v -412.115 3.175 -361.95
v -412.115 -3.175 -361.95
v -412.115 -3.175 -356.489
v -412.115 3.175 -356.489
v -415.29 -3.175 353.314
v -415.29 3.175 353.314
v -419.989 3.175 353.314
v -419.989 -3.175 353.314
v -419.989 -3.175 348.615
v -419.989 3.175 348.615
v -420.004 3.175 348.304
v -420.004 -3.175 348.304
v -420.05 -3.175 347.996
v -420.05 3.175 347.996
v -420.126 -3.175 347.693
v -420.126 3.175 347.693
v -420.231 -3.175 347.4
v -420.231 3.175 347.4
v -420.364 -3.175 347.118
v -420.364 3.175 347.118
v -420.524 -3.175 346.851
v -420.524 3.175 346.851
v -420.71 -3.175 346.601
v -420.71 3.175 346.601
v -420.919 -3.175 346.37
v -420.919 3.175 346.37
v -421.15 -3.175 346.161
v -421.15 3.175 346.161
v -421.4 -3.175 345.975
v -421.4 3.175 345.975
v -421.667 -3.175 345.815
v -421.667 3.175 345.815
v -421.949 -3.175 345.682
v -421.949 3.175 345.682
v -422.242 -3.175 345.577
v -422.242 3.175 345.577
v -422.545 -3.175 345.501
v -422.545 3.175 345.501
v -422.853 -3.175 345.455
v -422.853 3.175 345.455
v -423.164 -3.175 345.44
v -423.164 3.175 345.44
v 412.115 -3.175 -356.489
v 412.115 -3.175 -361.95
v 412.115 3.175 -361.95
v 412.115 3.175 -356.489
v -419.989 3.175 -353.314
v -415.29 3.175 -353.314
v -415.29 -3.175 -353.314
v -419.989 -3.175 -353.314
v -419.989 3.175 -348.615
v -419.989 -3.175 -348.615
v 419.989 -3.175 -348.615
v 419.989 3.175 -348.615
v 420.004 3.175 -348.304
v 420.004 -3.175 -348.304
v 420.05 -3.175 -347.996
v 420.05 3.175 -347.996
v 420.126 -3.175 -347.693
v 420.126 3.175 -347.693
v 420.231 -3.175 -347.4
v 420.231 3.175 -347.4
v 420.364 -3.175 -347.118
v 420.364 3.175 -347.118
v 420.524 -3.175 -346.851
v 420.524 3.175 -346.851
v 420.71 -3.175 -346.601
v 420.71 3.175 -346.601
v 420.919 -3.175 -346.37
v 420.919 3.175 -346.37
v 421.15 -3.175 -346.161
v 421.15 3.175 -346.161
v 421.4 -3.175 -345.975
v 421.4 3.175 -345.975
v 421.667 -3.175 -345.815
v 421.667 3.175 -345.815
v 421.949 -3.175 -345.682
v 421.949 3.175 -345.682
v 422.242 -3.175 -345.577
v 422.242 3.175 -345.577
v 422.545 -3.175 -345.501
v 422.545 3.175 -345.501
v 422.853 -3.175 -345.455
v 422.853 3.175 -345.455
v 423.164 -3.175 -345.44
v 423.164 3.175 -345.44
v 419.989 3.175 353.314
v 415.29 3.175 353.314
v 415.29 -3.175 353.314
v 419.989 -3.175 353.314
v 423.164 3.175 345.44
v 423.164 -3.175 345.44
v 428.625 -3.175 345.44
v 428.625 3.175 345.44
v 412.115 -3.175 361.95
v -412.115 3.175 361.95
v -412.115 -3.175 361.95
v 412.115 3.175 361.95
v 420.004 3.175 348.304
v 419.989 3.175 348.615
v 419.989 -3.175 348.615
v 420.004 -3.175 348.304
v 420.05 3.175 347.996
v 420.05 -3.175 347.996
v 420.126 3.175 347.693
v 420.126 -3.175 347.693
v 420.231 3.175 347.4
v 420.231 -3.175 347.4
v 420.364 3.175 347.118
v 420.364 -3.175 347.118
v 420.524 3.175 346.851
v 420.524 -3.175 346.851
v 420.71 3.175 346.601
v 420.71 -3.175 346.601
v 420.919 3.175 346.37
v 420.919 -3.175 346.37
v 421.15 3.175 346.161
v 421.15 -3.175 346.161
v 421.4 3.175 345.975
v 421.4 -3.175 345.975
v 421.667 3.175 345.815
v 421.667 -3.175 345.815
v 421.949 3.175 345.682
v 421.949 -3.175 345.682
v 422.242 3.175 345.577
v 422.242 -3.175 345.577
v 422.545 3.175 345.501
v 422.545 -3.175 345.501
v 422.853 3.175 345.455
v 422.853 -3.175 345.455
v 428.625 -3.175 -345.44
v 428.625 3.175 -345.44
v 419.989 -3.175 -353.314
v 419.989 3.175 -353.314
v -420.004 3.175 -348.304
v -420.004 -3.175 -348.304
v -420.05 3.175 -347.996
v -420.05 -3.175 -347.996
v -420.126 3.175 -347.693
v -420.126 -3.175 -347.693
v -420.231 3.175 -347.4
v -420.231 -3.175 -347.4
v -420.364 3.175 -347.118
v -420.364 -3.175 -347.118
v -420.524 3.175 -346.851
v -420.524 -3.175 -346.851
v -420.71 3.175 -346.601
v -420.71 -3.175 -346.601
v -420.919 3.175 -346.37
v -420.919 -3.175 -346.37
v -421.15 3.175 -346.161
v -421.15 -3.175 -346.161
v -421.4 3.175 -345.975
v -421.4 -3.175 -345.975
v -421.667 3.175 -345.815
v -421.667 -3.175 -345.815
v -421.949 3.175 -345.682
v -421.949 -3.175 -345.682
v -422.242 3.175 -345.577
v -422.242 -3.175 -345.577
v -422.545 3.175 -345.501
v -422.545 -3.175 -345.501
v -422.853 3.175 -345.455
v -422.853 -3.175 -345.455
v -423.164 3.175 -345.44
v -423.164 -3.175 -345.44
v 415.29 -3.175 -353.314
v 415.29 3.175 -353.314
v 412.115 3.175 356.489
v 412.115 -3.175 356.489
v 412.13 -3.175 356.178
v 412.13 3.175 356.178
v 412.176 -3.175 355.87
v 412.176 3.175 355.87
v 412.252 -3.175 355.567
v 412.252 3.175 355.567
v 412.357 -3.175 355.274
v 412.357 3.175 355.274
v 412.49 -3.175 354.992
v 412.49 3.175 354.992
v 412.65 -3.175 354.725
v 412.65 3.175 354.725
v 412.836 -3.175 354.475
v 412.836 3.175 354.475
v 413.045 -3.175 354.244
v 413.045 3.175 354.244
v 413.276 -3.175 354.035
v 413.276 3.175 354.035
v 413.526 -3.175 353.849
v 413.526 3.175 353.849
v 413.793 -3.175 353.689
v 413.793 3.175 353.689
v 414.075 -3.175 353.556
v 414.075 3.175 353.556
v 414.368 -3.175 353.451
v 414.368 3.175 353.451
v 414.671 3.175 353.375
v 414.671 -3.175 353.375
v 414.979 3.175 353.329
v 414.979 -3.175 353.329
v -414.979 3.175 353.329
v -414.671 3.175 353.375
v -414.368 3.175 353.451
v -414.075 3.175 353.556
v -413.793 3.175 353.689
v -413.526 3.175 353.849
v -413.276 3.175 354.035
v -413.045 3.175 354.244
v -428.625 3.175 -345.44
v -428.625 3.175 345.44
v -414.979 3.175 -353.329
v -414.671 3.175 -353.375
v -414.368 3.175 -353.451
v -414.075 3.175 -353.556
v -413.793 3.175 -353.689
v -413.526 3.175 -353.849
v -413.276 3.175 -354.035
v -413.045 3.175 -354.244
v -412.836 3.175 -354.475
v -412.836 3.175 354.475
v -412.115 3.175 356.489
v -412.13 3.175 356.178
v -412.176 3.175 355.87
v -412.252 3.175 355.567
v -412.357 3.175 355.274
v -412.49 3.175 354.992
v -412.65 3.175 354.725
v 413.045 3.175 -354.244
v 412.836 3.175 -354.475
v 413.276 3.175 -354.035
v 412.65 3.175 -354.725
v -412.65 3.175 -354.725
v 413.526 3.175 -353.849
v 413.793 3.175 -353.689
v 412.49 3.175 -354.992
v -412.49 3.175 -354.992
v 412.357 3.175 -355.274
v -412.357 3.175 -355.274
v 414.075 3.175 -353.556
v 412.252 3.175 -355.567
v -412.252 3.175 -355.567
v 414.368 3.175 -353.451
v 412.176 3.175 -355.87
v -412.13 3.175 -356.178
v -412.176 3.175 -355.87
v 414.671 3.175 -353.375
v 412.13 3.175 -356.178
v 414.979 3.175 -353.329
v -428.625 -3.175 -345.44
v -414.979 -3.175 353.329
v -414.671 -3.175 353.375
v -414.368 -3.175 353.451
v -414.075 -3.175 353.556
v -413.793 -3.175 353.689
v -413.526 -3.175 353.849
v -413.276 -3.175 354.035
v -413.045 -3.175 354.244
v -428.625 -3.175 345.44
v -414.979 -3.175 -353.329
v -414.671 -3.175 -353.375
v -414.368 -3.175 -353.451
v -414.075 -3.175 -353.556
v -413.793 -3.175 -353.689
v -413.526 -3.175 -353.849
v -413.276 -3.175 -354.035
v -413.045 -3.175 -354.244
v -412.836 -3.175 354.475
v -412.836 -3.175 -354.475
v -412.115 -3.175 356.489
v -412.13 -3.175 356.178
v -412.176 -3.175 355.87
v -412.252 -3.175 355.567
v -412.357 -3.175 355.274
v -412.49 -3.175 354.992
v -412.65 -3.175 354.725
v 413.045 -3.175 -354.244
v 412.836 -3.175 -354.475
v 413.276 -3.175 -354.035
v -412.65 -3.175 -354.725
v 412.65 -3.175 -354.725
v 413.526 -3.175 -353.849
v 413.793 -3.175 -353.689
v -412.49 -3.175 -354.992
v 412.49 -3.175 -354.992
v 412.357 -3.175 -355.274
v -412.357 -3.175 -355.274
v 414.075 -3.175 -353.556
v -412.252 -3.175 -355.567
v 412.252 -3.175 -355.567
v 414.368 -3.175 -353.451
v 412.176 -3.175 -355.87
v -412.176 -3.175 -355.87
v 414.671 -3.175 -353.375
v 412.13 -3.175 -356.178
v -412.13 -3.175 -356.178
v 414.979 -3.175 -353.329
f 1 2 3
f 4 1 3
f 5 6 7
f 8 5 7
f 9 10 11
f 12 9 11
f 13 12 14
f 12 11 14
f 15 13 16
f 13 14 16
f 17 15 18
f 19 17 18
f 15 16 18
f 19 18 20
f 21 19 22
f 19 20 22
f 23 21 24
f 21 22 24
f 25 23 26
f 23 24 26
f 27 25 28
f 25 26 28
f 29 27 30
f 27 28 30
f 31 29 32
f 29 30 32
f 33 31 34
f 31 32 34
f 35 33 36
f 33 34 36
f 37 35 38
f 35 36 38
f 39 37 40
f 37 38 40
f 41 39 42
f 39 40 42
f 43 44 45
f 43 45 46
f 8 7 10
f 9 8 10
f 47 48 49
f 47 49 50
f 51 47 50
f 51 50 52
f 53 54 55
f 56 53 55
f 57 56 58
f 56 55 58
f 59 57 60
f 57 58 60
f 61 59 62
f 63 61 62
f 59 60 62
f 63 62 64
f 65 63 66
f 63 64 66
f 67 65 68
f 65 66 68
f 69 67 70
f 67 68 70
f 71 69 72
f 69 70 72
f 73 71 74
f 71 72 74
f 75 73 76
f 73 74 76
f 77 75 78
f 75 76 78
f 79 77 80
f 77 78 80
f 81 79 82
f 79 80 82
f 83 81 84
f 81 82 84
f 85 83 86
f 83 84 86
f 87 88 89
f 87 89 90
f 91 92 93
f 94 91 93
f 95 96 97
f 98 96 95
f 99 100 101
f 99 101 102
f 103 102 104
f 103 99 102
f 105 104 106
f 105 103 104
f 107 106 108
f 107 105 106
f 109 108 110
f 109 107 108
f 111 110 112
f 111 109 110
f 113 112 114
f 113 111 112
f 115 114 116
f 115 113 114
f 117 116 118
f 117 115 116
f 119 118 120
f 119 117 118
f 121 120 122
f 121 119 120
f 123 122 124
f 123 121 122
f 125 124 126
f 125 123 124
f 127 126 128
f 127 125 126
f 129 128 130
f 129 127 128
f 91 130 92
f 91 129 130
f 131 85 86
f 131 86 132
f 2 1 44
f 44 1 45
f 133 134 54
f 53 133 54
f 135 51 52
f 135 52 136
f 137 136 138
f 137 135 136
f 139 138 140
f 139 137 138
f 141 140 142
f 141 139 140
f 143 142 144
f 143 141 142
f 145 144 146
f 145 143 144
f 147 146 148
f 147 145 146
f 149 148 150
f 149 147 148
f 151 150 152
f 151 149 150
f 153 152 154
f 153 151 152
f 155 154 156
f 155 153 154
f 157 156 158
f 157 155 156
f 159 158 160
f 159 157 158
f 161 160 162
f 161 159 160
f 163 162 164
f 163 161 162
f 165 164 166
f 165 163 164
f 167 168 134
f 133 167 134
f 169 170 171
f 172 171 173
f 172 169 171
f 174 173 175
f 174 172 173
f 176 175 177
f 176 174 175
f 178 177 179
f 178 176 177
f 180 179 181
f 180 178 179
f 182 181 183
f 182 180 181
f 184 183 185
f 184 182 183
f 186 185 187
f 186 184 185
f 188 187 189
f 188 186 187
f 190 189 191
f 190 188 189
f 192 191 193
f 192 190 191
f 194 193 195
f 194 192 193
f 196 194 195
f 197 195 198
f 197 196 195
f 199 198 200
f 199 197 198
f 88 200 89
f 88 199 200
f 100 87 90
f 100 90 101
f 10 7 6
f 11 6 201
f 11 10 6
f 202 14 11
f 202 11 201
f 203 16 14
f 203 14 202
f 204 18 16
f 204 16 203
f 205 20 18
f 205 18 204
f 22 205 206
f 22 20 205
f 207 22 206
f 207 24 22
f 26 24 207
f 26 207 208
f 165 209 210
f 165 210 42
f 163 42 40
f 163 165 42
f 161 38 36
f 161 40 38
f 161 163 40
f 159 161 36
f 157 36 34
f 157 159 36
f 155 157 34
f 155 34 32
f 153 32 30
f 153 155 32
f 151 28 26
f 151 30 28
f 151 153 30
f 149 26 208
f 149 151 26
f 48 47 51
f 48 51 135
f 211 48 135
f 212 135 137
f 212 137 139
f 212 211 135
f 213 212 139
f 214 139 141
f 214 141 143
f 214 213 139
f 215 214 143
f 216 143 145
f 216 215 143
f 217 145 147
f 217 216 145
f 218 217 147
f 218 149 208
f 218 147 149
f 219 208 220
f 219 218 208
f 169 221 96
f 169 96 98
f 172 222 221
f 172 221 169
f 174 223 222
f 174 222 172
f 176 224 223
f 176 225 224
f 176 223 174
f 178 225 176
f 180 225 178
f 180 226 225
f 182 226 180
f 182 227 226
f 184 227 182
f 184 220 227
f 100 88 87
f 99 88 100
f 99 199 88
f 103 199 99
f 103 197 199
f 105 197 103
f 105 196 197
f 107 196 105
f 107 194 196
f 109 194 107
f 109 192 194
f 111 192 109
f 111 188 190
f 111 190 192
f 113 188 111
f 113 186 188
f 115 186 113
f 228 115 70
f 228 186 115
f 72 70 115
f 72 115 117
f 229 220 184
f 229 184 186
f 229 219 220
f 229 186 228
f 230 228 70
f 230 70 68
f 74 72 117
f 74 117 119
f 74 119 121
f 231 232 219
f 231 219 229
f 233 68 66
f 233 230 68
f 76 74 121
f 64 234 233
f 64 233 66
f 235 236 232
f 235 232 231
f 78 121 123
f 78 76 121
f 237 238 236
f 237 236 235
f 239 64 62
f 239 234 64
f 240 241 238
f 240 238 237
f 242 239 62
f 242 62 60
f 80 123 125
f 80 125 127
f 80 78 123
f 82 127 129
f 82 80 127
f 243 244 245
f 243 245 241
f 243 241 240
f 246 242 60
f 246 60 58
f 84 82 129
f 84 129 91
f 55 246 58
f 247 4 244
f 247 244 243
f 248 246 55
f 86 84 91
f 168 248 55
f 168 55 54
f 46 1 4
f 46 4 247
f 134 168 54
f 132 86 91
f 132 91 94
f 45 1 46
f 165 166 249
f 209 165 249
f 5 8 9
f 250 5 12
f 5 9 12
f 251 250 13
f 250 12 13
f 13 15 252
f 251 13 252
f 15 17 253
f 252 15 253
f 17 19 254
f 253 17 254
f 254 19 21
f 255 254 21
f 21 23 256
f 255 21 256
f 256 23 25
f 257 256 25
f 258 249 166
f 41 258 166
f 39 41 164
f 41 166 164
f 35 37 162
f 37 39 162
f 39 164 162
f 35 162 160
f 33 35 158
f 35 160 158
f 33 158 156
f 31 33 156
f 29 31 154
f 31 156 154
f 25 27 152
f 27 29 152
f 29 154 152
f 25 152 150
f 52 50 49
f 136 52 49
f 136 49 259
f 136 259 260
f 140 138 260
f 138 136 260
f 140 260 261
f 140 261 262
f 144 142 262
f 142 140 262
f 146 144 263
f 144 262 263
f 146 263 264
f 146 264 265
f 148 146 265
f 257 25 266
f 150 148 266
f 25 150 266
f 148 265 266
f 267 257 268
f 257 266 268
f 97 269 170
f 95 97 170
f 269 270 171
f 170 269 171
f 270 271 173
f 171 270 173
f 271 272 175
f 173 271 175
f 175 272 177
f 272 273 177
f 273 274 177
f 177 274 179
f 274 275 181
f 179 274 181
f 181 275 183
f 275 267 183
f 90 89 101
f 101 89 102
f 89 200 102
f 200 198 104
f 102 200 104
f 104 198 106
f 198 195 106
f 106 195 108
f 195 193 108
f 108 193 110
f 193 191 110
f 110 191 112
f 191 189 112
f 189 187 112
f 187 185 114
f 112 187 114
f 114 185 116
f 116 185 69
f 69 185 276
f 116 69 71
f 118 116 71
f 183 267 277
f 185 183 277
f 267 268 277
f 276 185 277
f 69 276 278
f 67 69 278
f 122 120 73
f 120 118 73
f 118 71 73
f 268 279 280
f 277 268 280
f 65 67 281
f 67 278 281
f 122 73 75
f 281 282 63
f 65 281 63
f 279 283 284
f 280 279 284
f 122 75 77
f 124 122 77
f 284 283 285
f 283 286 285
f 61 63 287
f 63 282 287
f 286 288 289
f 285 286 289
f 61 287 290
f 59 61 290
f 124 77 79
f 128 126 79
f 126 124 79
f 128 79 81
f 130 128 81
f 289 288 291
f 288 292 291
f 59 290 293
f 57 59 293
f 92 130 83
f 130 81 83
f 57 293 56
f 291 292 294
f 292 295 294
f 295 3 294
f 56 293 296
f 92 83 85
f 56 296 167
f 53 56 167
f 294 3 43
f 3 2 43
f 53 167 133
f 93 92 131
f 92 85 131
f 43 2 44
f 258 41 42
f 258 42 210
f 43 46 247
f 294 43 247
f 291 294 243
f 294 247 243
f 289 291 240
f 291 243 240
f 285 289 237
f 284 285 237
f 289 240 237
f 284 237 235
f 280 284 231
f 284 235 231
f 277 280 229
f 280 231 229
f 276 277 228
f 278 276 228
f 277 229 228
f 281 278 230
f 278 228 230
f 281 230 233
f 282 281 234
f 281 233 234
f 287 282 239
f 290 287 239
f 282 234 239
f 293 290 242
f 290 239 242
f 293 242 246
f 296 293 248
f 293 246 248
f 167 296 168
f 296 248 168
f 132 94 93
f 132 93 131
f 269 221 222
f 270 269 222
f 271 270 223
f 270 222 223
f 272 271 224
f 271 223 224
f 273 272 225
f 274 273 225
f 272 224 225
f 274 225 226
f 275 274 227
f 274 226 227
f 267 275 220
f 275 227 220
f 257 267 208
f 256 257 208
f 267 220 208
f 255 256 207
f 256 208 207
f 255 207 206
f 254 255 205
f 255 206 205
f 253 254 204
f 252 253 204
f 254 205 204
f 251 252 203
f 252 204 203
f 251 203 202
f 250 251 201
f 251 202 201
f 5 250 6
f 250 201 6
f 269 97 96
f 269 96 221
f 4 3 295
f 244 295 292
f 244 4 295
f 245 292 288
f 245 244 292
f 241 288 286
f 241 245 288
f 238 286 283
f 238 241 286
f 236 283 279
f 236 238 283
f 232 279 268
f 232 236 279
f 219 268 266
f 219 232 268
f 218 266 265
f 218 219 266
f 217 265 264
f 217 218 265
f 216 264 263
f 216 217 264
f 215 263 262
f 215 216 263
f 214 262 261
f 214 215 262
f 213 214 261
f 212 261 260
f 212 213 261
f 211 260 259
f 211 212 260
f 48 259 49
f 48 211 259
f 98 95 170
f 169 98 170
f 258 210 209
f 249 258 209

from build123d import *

# Parameters (mm, degrees)
SKETCH1_W            = 857.25
SKETCH1_H            = 723.9
BOSS_EXTRUDE1_DEPTH  = 3.175
CUT_EXTRUDE1_DEPTH   = 562.041456245
MIRROR2_COPY_1_DEPTH = 562.041456245


with BuildPart() as part:
    # Sketch1 → Boss-Extrude1 (new, symmetric)
    with BuildSketch(Plane(origin=(0, 0, 0), x_dir=(1, 0, 0), z_dir=(0, 1, 0))):
        Rectangle(SKETCH1_W, SKETCH1_H)
    extrude(amount=BOSS_EXTRUDE1_DEPTH, both=True)

    # Sketch2 → Cut-Extrude1 (cut, through all)
    with BuildSketch(Plane(origin=(0, 3.175, 0), x_dir=(1, 0, 0), z_dir=(0, 1, 0))):
        with BuildLine():
            Line((-428.625, 361.95), (-412.115, 361.95))
            Line((-412.115, 361.95), (-412.115, 356.489))
            ThreePointArc((-412.115, 356.489), (-413.04493597, 354.24393597), (-415.29, 353.314))
            Line((-415.29, 353.314), (-419.989, 353.314))
            Line((-419.989, 353.314), (-419.989, 348.615))
            ThreePointArc((-419.989, 348.615), (-420.91893597, 346.36993597), (-423.164, 345.44))
            Line((-423.164, 345.44), (-428.625, 345.44))
            Line((-428.625, 345.44), (-428.625, 361.95))
        make_face()
    cut_extrude1 = extrude(amount=-CUT_EXTRUDE1_DEPTH, mode=Mode.SUBTRACT)

    # Mirror1: Cut-Extrude1 across plane
    add(cut_extrude1.mirror(Plane(origin=(0, 0, 0), x_dir=(0, 0, 1), z_dir=(1, 0, 0))), mode=Mode.SUBTRACT)

    # Mirror2: Cut-Extrude1 across plane
    add(cut_extrude1.mirror(Plane.XY), mode=Mode.SUBTRACT)

    # Mirror2 copy 1 sketch → Mirror2 copy 1 (cut, through all)
    with BuildSketch(Plane(origin=(0, 3.175, 0), x_dir=(-1, 0, 0), z_dir=(0, 1, 0))):
        with BuildLine():
            Line((-428.625, 361.95), (-412.115, 361.95))
            Line((-412.115, 361.95), (-412.115, 356.489))
            ThreePointArc((-412.115, 356.489), (-413.04493597, 354.24393597), (-415.29, 353.314))
            Line((-415.29, 353.314), (-419.989, 353.314))
            Line((-419.989, 353.314), (-419.989, 348.615))
            ThreePointArc((-419.989, 348.615), (-420.91893597, 346.36993597), (-423.164, 345.44))
            Line((-423.164, 345.44), (-428.625, 345.44))
            Line((-428.625, 345.44), (-428.625, 361.95))
        make_face()
    extrude(amount=-MIRROR2_COPY_1_DEPTH, mode=Mode.SUBTRACT)


solid = part.part
